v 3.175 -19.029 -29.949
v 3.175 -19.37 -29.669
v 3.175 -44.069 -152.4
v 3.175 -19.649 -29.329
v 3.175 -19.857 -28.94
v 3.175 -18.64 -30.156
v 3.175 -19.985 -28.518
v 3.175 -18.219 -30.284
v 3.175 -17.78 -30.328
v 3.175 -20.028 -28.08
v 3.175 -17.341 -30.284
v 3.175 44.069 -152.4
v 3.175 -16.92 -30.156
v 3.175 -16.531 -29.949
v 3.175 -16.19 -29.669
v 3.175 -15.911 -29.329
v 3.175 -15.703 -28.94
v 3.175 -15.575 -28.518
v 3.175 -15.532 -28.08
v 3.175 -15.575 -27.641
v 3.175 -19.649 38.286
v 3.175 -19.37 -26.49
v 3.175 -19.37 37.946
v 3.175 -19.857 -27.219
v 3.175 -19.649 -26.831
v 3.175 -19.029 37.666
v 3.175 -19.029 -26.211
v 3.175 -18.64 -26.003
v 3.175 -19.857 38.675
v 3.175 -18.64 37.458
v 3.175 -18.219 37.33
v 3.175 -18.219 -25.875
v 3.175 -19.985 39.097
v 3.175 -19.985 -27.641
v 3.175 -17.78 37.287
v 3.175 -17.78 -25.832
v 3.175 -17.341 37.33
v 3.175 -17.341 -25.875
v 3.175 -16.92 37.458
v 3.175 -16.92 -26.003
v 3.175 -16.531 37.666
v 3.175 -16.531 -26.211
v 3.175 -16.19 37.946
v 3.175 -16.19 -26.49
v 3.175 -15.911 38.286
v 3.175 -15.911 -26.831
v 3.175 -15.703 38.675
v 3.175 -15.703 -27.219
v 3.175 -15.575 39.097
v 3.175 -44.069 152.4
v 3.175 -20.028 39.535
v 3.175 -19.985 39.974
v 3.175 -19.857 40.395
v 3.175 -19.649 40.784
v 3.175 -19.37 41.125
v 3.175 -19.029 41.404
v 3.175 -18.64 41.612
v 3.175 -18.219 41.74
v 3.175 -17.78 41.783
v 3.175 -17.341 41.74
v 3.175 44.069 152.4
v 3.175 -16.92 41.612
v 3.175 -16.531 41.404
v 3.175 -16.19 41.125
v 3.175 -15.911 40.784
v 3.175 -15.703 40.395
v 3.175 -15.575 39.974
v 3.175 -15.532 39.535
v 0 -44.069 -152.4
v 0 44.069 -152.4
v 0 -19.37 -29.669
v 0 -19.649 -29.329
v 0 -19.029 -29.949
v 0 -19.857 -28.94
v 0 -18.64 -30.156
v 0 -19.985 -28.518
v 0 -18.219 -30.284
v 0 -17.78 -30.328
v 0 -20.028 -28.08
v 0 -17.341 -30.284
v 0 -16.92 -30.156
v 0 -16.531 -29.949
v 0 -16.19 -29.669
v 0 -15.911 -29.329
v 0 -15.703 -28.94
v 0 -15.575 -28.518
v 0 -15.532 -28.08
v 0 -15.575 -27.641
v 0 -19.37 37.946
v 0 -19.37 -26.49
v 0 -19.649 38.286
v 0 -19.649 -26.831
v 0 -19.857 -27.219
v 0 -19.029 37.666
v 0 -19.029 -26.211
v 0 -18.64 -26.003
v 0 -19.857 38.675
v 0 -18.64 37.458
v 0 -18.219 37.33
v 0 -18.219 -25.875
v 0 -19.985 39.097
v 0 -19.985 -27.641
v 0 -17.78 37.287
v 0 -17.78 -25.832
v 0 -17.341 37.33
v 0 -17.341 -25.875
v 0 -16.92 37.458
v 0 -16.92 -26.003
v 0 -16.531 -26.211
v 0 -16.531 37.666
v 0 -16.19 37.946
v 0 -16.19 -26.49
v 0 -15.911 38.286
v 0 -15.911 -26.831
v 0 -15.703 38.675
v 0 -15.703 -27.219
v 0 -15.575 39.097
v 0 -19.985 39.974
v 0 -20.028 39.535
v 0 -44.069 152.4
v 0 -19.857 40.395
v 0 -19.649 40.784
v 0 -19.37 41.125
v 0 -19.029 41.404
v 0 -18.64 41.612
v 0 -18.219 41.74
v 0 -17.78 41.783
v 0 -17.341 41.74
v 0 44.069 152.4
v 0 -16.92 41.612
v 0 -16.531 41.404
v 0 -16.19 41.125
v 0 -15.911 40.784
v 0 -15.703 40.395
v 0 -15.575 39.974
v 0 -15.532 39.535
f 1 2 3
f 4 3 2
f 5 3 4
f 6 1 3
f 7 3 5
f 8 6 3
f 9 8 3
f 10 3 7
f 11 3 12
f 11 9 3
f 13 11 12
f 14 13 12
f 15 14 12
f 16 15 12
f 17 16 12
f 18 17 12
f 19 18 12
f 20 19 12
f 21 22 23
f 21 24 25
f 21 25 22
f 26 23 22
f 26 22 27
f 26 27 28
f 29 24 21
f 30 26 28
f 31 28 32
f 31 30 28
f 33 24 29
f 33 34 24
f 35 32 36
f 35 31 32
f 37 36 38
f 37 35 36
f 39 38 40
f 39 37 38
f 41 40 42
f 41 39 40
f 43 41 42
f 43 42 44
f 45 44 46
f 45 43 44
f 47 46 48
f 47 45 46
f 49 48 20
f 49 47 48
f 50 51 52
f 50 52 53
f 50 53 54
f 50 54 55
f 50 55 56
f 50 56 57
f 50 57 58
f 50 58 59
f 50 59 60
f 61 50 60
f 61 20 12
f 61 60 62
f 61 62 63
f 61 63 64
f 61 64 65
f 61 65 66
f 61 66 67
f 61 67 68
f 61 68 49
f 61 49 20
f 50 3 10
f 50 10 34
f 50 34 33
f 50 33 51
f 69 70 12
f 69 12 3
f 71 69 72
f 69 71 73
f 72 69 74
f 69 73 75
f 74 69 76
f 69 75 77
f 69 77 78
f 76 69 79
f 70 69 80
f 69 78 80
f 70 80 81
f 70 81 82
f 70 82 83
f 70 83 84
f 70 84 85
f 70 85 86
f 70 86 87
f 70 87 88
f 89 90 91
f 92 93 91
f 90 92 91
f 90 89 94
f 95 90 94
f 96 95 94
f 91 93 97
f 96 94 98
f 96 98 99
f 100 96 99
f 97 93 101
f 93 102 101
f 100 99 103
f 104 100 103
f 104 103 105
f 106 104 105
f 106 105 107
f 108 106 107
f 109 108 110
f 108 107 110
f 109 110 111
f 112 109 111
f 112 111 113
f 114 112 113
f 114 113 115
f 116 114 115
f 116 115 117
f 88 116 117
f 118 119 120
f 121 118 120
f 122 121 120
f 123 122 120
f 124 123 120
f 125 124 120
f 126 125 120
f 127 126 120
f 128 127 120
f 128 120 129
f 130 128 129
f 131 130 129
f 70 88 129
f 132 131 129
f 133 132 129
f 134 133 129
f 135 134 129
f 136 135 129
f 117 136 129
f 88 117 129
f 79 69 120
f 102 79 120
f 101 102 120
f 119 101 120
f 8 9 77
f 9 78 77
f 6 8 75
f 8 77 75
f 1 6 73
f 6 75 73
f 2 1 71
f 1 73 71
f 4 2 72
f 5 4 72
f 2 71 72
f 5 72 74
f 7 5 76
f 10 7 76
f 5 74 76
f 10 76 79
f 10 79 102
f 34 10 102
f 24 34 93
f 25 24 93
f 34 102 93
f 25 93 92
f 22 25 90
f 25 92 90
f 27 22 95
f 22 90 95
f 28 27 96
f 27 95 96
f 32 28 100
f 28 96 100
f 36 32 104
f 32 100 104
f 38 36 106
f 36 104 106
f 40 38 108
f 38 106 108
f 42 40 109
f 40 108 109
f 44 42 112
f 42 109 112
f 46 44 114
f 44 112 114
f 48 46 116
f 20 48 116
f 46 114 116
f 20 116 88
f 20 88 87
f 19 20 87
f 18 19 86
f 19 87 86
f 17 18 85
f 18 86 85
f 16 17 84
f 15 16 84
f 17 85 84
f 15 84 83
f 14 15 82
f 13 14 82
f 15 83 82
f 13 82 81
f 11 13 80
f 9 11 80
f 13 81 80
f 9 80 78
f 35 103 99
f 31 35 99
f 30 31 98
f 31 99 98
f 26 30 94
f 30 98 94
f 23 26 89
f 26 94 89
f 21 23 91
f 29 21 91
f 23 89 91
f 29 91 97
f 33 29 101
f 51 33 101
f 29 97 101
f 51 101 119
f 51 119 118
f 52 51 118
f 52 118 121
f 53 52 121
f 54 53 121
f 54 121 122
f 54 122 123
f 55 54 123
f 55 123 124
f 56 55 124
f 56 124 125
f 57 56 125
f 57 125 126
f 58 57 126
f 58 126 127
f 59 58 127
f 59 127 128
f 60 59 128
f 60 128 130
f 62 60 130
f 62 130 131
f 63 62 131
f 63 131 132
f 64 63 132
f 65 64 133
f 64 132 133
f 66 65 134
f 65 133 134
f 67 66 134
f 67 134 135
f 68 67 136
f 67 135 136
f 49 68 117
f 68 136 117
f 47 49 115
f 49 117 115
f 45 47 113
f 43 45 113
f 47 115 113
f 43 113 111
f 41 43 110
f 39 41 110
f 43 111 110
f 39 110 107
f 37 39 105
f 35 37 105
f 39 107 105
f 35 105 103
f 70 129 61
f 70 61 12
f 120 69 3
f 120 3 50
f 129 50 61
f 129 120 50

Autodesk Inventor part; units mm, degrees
ref_plane "YZ Plane" through (0, 0, 0) normal (1, 0, 0) x (0, 1, 0)
ref_plane "XZ Plane" through (0, 0, 0) normal (0, 1, 0) x (-1, 0, 0)
ref_plane "XY Plane" through (0, 0, 0) normal (0, 0, 1) x (1, 0, 0)
sketch "Sketch1" plane through (0, 0, 0) normal (1, 0, 0) x (0, 1, 0)
  line L0 (-44.069, 152.4) -> (44.069, 152.4)
  line L1 (44.069, 152.4) -> (44.069, -152.4)
  line L2 (44.069, -152.4) -> (-44.069, -152.4)
  line L3 (-44.069, -152.4) -> (-44.069, 152.4)
  line L4 (-44.069, 152.4) -> (44.069, -152.4) construction
  line L5 (44.069, 152.4) -> (-44.069, -152.4) construction
  point P0 (0, 0)
  dimension "d0" = 304.8
  dimension "d1" = 88.138
extrude "Extrusion1" add sketch "Sketch1" along normal blind 3.175
sketch "Sketch2" plane through (3.175, 0, 0) normal (1, 0, 0) x (0, 0, -1)
  line L0 (-73.3679, -44.069) -> (61.9125, -44.069) construction
  line L1 (61.9125, -44.069) -> (61.9125, 0.127) construction
  line L2 (61.9125, 0.127) -> (-73.3679, 0.127) construction
  line L3 (-73.3679, 0.127) -> (-73.3679, -44.069) construction
  line L4 (-73.3679, -44.069) -> (61.9125, 0.127) construction
  line L5 (61.9125, -44.069) -> (-73.3679, 0.127) construction
  line L6 (152.4, -44.069) -> (152.4, 44.069) construction
  line L7 (-152.4, -44.069) -> (152.4, -44.069) construction
  point P0 (0, 0)
  point P1 (-5.7277, -21.971)
  point P2 (10.6003, -44.069)
  dimension "d4" = 135.2804
  dimension "d5" = 44.196
  dimension "d6" = 90.4875
sketch "Sketch3" plane through (3.175, 0, 0) normal (1, 0, 0) x (0, 0, -1)
  line L0 (-39.5351, -17.78) -> (28.0797, -17.78) construction
  line L1 (-152.4, -44.069) -> (152.4, -44.069) construction
  line L2 (61.9125, -44.069) -> (61.9125, 0.127) construction
  line L3 (-73.3679, 0.127) -> (-73.3679, -44.069) construction
  point P0 (0, 0)
  dimension "d7" = 26.289
  dimension "d8" = 33.8328
  dimension "d9" = 33.8328
hole "Hole1" at (3.175, -17.78, 39.5351) at (3.175, -17.78, -28.0797) direction (-1, 0, 0) diameter 4.4958 end through all clearance for "Countersunk Flat Head Screw ISO 2009/7046" size "M4" standard "ISO"
properties part number "nmt_sidepanel_12in"
